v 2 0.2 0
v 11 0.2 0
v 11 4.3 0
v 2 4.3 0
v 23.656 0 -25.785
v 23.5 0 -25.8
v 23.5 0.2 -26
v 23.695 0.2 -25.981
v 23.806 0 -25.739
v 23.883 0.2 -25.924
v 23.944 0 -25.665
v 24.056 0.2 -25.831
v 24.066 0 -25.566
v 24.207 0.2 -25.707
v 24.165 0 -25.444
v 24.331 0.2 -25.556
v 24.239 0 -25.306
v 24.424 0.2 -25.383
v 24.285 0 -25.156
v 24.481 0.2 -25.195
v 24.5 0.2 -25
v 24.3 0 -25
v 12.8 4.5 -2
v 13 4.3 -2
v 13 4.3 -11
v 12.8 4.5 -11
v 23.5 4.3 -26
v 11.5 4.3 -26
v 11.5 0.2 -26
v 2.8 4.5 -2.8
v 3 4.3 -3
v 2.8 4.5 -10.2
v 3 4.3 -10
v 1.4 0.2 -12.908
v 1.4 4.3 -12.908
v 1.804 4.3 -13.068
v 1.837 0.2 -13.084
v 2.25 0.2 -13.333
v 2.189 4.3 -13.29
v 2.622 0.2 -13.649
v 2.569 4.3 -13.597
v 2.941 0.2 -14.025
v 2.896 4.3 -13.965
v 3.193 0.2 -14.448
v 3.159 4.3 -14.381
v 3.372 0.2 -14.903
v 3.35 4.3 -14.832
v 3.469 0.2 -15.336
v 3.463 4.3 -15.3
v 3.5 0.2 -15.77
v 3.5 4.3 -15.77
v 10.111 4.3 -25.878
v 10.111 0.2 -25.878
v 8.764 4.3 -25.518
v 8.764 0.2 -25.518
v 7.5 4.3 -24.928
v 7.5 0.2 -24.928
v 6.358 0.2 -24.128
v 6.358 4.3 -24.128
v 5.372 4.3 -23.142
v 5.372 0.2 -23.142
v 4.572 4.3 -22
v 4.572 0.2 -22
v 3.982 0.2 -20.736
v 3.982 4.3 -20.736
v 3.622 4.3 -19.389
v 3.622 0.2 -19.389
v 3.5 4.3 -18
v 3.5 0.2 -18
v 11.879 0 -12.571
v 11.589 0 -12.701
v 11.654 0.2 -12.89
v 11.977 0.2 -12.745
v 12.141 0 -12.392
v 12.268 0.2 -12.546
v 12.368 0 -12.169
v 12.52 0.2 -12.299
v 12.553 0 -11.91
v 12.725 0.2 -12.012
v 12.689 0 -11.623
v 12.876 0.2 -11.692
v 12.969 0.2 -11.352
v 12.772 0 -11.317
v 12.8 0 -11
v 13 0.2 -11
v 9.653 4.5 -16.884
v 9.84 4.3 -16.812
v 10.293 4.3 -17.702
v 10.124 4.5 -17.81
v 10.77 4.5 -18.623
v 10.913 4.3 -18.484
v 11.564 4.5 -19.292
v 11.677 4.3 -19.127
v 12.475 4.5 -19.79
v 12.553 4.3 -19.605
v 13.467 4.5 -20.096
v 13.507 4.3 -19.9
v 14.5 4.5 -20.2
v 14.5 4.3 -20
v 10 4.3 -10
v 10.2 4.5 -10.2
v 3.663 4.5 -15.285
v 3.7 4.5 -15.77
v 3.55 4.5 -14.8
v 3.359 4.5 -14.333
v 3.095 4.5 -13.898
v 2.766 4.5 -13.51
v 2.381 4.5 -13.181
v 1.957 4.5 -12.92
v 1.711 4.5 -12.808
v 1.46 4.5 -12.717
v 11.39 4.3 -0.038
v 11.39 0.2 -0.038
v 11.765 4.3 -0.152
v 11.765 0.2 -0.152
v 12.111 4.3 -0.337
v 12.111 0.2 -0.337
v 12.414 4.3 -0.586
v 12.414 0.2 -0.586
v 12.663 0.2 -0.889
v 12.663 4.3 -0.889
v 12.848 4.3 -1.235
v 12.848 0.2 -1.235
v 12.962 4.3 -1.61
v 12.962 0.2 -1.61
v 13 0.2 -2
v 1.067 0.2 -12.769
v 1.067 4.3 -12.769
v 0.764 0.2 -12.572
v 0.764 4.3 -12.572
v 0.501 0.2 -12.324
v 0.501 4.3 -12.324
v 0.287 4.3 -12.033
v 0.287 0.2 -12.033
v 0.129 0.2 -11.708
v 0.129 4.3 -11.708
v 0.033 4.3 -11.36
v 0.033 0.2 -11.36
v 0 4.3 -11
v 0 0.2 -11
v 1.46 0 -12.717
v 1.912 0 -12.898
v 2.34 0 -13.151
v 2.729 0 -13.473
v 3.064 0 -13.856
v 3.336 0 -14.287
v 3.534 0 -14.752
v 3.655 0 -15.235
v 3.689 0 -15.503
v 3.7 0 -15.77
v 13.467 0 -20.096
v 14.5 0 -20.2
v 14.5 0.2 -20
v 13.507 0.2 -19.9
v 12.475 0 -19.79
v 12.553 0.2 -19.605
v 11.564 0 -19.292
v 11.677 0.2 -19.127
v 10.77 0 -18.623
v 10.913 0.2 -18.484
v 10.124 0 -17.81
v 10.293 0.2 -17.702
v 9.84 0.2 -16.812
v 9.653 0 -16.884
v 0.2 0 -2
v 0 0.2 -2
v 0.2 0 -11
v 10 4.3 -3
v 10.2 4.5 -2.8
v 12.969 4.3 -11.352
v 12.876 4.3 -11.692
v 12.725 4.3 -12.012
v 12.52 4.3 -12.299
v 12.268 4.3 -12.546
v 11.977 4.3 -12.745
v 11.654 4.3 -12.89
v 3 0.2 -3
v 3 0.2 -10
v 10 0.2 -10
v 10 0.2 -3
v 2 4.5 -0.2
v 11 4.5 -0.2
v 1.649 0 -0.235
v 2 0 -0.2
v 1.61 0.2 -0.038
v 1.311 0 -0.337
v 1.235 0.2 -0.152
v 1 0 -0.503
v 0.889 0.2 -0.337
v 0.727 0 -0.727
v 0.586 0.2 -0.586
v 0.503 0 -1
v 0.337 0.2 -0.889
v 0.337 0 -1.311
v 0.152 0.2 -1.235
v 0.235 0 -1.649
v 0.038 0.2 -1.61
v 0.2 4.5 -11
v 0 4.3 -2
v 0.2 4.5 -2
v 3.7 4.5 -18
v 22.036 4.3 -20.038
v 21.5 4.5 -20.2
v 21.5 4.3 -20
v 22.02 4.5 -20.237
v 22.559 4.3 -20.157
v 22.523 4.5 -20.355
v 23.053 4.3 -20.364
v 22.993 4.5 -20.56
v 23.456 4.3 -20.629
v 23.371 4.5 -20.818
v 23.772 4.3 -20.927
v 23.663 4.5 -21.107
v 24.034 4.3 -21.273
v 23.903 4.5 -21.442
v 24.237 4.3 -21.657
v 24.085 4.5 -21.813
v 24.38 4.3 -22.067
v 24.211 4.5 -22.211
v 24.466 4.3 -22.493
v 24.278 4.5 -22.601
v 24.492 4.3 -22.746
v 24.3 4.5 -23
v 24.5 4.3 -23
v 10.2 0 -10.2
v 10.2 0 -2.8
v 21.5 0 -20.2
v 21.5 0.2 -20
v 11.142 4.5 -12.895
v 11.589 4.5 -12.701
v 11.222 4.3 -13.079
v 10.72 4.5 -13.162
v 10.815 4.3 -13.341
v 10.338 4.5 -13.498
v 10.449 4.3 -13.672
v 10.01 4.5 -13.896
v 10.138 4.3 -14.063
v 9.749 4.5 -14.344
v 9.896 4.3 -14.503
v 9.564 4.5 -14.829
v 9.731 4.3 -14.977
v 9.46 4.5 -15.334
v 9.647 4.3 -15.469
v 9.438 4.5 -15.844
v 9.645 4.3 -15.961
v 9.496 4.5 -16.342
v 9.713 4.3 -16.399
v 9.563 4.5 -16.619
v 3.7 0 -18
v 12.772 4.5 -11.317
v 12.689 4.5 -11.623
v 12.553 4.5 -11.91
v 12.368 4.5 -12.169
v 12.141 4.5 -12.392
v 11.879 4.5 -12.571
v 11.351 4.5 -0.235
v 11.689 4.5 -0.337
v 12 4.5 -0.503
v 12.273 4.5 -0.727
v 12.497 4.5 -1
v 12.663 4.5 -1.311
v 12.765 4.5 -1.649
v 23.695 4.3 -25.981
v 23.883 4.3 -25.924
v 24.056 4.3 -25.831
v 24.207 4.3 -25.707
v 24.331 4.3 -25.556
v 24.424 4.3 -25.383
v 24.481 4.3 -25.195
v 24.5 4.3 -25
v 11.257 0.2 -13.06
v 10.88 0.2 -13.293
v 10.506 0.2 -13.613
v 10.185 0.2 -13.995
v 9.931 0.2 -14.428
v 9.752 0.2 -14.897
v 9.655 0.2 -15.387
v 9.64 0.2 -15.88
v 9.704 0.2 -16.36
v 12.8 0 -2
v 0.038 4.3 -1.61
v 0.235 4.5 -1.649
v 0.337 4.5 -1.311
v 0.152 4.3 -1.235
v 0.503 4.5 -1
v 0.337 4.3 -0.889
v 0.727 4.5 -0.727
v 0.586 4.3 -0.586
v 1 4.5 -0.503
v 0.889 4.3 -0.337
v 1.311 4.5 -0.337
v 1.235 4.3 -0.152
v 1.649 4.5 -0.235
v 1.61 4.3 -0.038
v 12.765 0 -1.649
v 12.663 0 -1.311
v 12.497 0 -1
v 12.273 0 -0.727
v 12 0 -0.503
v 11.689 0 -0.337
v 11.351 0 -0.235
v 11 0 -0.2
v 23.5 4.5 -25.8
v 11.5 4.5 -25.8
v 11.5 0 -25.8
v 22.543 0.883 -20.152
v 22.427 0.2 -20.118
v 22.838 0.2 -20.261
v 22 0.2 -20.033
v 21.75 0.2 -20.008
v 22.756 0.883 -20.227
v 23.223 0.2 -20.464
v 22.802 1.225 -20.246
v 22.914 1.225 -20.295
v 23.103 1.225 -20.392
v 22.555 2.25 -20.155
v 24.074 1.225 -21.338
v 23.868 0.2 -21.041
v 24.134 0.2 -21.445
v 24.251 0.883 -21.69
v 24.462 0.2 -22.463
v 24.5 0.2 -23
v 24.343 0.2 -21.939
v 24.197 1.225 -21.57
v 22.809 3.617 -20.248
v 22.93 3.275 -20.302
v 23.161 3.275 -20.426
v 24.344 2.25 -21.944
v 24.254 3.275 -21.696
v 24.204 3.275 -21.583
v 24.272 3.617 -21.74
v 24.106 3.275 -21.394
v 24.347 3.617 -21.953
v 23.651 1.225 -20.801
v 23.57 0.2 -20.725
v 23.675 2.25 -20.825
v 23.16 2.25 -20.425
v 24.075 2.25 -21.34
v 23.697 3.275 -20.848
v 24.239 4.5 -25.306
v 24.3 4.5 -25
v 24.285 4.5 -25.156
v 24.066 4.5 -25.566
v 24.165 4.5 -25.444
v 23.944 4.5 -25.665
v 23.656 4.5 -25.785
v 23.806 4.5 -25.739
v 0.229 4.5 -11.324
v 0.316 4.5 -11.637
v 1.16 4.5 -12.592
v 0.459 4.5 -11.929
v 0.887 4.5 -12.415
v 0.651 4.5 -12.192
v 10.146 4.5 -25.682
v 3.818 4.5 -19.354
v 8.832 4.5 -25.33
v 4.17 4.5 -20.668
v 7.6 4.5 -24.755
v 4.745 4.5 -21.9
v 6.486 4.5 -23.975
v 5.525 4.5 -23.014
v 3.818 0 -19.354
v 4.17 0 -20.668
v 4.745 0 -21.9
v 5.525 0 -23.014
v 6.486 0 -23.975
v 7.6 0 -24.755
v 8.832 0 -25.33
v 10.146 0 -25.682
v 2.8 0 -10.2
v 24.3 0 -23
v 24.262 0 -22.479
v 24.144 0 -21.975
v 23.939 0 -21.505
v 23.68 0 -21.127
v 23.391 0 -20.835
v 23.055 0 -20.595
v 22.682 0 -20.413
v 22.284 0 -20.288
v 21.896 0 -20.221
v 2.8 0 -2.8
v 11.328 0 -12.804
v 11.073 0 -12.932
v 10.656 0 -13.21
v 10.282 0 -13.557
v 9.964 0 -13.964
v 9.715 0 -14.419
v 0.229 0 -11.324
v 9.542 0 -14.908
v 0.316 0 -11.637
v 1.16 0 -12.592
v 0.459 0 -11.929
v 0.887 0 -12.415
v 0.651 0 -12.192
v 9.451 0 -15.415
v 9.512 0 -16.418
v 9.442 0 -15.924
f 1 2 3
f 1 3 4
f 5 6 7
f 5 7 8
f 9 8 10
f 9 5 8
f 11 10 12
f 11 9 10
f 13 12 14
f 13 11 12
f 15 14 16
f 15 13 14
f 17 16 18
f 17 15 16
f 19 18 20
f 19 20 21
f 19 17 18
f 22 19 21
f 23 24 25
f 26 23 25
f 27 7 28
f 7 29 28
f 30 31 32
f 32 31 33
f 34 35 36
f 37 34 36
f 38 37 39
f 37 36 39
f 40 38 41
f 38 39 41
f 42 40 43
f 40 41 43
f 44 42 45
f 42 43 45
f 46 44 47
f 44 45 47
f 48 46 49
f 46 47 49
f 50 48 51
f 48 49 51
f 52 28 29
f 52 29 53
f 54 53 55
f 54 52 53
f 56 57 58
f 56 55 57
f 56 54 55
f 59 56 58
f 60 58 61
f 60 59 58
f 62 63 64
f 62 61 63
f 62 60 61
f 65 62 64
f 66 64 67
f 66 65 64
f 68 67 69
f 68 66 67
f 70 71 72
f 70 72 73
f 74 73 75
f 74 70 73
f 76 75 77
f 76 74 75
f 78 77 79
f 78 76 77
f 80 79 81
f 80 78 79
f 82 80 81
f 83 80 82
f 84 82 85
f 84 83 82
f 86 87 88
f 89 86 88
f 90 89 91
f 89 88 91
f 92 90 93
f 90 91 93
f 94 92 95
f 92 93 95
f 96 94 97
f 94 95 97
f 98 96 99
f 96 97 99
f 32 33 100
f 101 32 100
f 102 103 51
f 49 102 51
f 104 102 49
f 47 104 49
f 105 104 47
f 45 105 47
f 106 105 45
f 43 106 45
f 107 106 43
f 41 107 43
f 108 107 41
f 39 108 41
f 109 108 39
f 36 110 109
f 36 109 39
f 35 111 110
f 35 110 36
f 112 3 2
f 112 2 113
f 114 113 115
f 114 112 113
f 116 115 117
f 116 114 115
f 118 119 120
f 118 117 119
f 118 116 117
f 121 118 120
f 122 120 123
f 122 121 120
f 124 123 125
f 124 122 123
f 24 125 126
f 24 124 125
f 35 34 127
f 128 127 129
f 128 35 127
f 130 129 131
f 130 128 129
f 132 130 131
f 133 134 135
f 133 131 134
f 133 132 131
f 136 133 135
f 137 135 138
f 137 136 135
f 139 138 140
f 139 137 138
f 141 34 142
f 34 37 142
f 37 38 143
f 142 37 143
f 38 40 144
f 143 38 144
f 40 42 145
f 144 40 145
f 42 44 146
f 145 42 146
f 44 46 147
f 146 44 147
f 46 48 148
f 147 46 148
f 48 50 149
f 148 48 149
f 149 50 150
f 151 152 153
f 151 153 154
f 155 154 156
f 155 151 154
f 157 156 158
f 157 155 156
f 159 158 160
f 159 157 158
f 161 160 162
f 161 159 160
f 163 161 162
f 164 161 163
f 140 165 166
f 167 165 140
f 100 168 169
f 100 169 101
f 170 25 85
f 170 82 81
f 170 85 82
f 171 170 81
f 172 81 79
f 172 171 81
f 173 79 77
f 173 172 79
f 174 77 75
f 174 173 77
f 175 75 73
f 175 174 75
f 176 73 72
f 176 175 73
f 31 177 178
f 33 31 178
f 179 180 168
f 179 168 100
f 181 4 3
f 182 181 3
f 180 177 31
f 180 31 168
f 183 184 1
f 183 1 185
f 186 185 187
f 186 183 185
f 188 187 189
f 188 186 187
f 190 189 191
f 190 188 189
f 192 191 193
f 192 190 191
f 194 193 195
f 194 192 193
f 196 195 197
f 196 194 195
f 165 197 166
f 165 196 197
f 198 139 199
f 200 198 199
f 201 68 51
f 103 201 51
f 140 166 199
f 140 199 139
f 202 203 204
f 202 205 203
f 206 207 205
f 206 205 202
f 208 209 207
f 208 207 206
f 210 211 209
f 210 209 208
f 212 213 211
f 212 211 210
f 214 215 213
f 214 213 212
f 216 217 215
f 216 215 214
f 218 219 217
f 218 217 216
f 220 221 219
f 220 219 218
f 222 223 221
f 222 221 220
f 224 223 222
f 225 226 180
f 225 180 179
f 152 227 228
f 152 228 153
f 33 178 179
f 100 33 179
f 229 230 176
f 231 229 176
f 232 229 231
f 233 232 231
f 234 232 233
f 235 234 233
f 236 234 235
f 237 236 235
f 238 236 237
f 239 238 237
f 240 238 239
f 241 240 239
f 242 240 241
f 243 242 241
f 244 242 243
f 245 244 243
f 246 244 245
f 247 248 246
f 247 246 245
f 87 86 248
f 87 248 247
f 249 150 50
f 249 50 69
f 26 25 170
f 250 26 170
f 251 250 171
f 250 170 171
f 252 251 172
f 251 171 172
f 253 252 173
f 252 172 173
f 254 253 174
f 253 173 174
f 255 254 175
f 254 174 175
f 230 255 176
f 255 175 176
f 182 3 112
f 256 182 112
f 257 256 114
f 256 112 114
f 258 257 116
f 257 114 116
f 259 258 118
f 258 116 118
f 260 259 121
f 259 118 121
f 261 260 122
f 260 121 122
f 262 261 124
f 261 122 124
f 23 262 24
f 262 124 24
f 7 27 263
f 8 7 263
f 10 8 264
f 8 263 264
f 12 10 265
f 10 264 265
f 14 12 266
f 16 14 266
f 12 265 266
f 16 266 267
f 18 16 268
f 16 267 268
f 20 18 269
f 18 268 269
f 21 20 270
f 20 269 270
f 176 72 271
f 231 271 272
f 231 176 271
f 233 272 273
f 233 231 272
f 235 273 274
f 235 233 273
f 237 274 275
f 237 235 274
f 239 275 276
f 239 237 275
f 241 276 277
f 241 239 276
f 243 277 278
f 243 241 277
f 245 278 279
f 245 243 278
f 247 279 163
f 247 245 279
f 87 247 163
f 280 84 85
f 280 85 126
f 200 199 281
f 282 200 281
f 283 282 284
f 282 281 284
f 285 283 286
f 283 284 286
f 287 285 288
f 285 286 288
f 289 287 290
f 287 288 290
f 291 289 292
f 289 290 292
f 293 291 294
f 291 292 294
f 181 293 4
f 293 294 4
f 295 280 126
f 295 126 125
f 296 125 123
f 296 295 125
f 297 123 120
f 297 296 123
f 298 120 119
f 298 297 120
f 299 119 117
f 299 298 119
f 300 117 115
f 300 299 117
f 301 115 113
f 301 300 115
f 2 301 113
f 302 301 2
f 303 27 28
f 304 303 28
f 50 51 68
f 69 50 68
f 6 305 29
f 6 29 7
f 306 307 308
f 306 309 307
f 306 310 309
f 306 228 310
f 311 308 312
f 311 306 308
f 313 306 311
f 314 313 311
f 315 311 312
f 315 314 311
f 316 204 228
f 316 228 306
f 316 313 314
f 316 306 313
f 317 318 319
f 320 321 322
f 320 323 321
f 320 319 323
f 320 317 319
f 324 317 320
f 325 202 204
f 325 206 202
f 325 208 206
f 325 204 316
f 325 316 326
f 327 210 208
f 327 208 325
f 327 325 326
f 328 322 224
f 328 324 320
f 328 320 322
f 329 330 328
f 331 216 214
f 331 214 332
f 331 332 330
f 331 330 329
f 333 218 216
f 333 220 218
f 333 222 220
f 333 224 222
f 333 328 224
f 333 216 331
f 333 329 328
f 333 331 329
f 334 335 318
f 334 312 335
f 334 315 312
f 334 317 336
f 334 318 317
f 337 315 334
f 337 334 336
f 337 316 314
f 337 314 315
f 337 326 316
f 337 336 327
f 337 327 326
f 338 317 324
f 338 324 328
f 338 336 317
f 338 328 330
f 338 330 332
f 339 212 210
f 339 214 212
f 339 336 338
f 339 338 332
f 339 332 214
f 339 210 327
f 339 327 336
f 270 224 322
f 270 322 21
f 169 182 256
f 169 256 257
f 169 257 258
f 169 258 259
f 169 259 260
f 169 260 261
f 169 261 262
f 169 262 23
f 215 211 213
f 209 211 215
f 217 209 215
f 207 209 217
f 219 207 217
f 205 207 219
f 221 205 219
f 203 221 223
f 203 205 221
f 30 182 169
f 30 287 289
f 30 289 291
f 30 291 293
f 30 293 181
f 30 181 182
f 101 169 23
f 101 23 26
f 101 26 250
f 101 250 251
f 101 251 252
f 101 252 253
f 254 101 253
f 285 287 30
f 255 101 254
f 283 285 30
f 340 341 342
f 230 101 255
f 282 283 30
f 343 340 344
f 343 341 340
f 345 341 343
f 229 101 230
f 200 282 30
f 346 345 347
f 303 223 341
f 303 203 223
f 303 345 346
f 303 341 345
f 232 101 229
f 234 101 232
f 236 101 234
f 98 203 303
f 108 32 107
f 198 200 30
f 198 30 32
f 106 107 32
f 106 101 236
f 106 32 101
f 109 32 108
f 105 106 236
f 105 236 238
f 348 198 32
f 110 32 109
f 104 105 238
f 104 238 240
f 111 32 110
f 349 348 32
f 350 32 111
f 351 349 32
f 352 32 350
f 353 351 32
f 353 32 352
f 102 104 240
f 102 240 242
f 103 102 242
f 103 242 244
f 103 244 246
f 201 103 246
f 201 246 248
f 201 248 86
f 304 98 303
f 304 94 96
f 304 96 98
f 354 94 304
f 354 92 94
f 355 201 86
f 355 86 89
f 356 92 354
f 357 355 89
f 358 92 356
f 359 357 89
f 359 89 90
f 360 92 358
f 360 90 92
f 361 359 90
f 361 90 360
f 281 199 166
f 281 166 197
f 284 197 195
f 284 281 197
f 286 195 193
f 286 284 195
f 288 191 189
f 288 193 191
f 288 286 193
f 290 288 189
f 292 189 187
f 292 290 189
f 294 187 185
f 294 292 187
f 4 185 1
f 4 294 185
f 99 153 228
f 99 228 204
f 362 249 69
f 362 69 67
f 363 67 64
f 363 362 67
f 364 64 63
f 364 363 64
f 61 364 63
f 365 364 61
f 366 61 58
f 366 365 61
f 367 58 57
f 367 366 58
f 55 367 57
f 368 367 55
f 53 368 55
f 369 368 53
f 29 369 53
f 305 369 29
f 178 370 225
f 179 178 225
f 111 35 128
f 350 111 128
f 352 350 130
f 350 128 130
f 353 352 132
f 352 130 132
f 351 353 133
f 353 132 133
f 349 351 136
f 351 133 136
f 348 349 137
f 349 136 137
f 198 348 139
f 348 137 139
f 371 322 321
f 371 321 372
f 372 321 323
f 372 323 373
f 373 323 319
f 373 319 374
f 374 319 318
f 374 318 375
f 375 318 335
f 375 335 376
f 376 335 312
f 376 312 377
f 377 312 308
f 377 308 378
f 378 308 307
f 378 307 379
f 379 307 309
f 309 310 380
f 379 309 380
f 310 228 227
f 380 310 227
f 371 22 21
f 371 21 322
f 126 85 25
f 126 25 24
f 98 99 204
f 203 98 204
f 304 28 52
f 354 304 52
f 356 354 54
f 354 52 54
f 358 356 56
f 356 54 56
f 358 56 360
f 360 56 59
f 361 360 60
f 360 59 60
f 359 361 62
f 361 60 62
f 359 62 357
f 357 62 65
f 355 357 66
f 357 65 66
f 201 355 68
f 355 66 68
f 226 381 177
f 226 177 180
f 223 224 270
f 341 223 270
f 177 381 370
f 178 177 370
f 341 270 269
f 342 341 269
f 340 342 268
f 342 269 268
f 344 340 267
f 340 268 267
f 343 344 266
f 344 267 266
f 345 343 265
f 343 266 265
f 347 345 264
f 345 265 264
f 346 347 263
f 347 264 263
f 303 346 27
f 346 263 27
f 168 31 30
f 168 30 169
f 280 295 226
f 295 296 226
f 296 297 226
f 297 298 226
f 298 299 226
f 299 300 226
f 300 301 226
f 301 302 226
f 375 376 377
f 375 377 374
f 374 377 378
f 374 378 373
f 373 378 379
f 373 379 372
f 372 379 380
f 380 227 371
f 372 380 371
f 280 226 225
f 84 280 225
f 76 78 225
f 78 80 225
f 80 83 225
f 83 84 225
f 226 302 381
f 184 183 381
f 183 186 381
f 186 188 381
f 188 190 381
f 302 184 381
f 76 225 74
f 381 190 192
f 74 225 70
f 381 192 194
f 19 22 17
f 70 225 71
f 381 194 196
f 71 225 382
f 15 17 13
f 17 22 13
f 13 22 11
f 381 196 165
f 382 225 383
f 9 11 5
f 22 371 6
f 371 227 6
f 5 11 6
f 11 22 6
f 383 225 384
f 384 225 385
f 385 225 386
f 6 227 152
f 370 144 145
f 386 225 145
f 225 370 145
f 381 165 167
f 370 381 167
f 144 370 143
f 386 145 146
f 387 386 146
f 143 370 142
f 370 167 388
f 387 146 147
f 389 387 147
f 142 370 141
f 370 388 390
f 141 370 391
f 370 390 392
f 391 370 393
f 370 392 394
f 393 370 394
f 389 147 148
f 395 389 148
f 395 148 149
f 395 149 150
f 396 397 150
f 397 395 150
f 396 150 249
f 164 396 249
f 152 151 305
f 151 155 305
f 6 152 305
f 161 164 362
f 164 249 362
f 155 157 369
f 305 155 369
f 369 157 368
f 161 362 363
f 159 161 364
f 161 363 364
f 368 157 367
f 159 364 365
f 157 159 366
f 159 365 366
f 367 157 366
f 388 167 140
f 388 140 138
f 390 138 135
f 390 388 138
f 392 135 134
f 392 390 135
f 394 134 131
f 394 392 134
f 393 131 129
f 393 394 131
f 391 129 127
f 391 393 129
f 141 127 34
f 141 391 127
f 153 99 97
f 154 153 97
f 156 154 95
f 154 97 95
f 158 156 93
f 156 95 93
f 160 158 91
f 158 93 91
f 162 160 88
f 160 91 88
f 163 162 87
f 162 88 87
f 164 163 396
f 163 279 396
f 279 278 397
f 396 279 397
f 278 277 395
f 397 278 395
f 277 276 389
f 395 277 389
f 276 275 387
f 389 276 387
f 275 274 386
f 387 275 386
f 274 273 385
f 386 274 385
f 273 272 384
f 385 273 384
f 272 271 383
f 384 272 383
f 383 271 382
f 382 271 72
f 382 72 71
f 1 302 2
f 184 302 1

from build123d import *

# Parameters (mm, degrees)
SKETCH_1_W      = 7
SKETCH_1_H      = 7
EXTRUDE_1_DEPTH = 4.5
SKETCH_4_W      = 6
SKETCH_4_H      = 4.5
EXTRUDE_4_DEPTH = 15
FILLET_1_SIZE   = 3
FILLET_3_R      = 5
FILLET_4_R      = 8
FILLET_5_R      = 2
FILLET_6_R      = 3
FILLET_7_R      = 1
CHAMFER_3_SIZE  = 0.2


with BuildPart() as part:
    # 草图1 → 凸台-拉伸1 (new body)
    with BuildSketch(Plane(origin=(0, 0, 0), x_dir=(1, 0, 0), z_dir=(0, 1, 0))):
        Polygon((9.5, 13), (13, 13), (13, 0), (0, 0), (0, 13), (3.5, 13), (3.5, 26), (9.5, 26), align=None)
        with Locations((6.5, 6.5)):
            Rectangle(SKETCH_1_W, SKETCH_1_H, mode=Mode.SUBTRACT)
    extrude(amount=EXTRUDE_1_DEPTH)

    # 草图4 → 凸台-拉伸4 (add)
    with BuildSketch(Plane(origin=(9.5, 0, 0), x_dir=(0, 0, -1), z_dir=(1, 0, 0))):
        with Locations((23, 2.25)):
            Rectangle(SKETCH_4_W, SKETCH_4_H)
    extrude(amount=EXTRUDE_4_DEPTH)

    # 圆角1
    # a fillet whose section is not a circle: 3 mm, written as the material it takes off along each edge
    with BuildSketch(Plane(origin=(24.5, 12, -20), x_dir=(-1, 0, 0), z_dir=(0, -1, 0))) as fillet_1_piece_1:
        with BuildLine():
            Bezier((FILLET_1_SIZE, 0), (0, 0), (0, FILLET_1_SIZE), weights=[1, 0.818181818, 1])
            Line((0, FILLET_1_SIZE), (0, 0))
            Line((0, 0), (FILLET_1_SIZE, 0))
        make_face()
    extrude(amount=19.5, mode=Mode.SUBTRACT)

    # 圆角3
    fillet_3_edges = [part.edges().sort_by_distance(p)[0] for p in [
        (9.5, 2.25, -20),
    ]]
    fillet(fillet_3_edges, radius=FILLET_3_R)

    # 圆角4
    fillet_4_edges = [part.edges().sort_by_distance(p)[0] for p in [
        (3.5, 2.25, -26),
    ]]
    fillet(fillet_4_edges, radius=FILLET_4_R)

    # 圆角5
    fillet_5_edges = [part.edges().sort_by_distance(p)[0] for p in [
        (0, 2.25, -13),
        (13, 2.25, -13),
        (13, 2.25, 0),
        (0, 2.25, 0),
    ]]
    fillet(fillet_5_edges, radius=FILLET_5_R)

    # 圆角6
    fillet_6_edges = [part.edges().sort_by_distance(p)[0] for p in [
        (9.5, 2.25, -13),
        (3.5, 2.25, -13),
    ]]
    fillet(fillet_6_edges, radius=FILLET_6_R)

    # 圆角7
    fillet_7_edges = [part.edges().sort_by_distance(p)[0] for p in [
        (24.5, 2.25, -26),
    ]]
    fillet(fillet_7_edges, radius=FILLET_7_R)

    # 倒角3
    chamfer_3_edges = [part.edges().sort_by_distance(p)[0] for p in [
        (18, 4.5, -20),
        (11.676872614, 4.5, -19.126736212),
        (11.676872614, 0, -19.126736212),
        (12.629227016, 0, -12.160008331),
        (12.629227016, 4.5, -12.160008331),
        (13, 4.5, -6.5),
        (13, 0, -6.5),
        (12.414213562, 4.5, -0.585786438),
        (12.414213562, 0, -0.585786438),
        (6.5, 0, 0),
        (6.5, 4.5, 0),
        (0.585786438, 4.5, -0.585786438),
        (0.585786438, 0, -0.585786438),
        (0, 0, -6.5),
        (0, 4.5, -6.5),
        (0.38754845, 4.5, -12.183215957),
        (0.38754845, 0, -12.183215957),
        (3.5, 0, -16.884848004),
        (3.5, 4.5, -16.884848004),
        (5.843145751, 4.5, -23.656854249),
        (5.843145751, 0, -23.656854249),
        (17.5, 4.5, -26),
        (17.5, 0, -26),
        (24.207106781, 0, -25.707106781),
        (24.207106781, 4.5, -25.707106781),
        (23.675, 4.5, -20.825),
        (23.675, 0, -20.825),
        (18, 0, -20),
        (10, 0, -6.5),
        (10, 4.5, -6.5),
        (6.5, 0, -3),
        (6.5, 4.5, -3),
        (3, 0, -6.5),
        (3, 4.5, -6.5),
        (6.5, 0, -10),
        (6.5, 4.5, -10),
        (2.918677324, 4.5, -13.994872072),
        (2.918677324, 0, -13.994872072),
        (9.913215245, 4.5, -14.465146968),
        (9.913215245, 0, -14.465146968),
        (24.5, 0, -24),
        (24.5, 4.5, -24),
    ]]
    chamfer(chamfer_3_edges, length=CHAMFER_3_SIZE)


solid = part.part
